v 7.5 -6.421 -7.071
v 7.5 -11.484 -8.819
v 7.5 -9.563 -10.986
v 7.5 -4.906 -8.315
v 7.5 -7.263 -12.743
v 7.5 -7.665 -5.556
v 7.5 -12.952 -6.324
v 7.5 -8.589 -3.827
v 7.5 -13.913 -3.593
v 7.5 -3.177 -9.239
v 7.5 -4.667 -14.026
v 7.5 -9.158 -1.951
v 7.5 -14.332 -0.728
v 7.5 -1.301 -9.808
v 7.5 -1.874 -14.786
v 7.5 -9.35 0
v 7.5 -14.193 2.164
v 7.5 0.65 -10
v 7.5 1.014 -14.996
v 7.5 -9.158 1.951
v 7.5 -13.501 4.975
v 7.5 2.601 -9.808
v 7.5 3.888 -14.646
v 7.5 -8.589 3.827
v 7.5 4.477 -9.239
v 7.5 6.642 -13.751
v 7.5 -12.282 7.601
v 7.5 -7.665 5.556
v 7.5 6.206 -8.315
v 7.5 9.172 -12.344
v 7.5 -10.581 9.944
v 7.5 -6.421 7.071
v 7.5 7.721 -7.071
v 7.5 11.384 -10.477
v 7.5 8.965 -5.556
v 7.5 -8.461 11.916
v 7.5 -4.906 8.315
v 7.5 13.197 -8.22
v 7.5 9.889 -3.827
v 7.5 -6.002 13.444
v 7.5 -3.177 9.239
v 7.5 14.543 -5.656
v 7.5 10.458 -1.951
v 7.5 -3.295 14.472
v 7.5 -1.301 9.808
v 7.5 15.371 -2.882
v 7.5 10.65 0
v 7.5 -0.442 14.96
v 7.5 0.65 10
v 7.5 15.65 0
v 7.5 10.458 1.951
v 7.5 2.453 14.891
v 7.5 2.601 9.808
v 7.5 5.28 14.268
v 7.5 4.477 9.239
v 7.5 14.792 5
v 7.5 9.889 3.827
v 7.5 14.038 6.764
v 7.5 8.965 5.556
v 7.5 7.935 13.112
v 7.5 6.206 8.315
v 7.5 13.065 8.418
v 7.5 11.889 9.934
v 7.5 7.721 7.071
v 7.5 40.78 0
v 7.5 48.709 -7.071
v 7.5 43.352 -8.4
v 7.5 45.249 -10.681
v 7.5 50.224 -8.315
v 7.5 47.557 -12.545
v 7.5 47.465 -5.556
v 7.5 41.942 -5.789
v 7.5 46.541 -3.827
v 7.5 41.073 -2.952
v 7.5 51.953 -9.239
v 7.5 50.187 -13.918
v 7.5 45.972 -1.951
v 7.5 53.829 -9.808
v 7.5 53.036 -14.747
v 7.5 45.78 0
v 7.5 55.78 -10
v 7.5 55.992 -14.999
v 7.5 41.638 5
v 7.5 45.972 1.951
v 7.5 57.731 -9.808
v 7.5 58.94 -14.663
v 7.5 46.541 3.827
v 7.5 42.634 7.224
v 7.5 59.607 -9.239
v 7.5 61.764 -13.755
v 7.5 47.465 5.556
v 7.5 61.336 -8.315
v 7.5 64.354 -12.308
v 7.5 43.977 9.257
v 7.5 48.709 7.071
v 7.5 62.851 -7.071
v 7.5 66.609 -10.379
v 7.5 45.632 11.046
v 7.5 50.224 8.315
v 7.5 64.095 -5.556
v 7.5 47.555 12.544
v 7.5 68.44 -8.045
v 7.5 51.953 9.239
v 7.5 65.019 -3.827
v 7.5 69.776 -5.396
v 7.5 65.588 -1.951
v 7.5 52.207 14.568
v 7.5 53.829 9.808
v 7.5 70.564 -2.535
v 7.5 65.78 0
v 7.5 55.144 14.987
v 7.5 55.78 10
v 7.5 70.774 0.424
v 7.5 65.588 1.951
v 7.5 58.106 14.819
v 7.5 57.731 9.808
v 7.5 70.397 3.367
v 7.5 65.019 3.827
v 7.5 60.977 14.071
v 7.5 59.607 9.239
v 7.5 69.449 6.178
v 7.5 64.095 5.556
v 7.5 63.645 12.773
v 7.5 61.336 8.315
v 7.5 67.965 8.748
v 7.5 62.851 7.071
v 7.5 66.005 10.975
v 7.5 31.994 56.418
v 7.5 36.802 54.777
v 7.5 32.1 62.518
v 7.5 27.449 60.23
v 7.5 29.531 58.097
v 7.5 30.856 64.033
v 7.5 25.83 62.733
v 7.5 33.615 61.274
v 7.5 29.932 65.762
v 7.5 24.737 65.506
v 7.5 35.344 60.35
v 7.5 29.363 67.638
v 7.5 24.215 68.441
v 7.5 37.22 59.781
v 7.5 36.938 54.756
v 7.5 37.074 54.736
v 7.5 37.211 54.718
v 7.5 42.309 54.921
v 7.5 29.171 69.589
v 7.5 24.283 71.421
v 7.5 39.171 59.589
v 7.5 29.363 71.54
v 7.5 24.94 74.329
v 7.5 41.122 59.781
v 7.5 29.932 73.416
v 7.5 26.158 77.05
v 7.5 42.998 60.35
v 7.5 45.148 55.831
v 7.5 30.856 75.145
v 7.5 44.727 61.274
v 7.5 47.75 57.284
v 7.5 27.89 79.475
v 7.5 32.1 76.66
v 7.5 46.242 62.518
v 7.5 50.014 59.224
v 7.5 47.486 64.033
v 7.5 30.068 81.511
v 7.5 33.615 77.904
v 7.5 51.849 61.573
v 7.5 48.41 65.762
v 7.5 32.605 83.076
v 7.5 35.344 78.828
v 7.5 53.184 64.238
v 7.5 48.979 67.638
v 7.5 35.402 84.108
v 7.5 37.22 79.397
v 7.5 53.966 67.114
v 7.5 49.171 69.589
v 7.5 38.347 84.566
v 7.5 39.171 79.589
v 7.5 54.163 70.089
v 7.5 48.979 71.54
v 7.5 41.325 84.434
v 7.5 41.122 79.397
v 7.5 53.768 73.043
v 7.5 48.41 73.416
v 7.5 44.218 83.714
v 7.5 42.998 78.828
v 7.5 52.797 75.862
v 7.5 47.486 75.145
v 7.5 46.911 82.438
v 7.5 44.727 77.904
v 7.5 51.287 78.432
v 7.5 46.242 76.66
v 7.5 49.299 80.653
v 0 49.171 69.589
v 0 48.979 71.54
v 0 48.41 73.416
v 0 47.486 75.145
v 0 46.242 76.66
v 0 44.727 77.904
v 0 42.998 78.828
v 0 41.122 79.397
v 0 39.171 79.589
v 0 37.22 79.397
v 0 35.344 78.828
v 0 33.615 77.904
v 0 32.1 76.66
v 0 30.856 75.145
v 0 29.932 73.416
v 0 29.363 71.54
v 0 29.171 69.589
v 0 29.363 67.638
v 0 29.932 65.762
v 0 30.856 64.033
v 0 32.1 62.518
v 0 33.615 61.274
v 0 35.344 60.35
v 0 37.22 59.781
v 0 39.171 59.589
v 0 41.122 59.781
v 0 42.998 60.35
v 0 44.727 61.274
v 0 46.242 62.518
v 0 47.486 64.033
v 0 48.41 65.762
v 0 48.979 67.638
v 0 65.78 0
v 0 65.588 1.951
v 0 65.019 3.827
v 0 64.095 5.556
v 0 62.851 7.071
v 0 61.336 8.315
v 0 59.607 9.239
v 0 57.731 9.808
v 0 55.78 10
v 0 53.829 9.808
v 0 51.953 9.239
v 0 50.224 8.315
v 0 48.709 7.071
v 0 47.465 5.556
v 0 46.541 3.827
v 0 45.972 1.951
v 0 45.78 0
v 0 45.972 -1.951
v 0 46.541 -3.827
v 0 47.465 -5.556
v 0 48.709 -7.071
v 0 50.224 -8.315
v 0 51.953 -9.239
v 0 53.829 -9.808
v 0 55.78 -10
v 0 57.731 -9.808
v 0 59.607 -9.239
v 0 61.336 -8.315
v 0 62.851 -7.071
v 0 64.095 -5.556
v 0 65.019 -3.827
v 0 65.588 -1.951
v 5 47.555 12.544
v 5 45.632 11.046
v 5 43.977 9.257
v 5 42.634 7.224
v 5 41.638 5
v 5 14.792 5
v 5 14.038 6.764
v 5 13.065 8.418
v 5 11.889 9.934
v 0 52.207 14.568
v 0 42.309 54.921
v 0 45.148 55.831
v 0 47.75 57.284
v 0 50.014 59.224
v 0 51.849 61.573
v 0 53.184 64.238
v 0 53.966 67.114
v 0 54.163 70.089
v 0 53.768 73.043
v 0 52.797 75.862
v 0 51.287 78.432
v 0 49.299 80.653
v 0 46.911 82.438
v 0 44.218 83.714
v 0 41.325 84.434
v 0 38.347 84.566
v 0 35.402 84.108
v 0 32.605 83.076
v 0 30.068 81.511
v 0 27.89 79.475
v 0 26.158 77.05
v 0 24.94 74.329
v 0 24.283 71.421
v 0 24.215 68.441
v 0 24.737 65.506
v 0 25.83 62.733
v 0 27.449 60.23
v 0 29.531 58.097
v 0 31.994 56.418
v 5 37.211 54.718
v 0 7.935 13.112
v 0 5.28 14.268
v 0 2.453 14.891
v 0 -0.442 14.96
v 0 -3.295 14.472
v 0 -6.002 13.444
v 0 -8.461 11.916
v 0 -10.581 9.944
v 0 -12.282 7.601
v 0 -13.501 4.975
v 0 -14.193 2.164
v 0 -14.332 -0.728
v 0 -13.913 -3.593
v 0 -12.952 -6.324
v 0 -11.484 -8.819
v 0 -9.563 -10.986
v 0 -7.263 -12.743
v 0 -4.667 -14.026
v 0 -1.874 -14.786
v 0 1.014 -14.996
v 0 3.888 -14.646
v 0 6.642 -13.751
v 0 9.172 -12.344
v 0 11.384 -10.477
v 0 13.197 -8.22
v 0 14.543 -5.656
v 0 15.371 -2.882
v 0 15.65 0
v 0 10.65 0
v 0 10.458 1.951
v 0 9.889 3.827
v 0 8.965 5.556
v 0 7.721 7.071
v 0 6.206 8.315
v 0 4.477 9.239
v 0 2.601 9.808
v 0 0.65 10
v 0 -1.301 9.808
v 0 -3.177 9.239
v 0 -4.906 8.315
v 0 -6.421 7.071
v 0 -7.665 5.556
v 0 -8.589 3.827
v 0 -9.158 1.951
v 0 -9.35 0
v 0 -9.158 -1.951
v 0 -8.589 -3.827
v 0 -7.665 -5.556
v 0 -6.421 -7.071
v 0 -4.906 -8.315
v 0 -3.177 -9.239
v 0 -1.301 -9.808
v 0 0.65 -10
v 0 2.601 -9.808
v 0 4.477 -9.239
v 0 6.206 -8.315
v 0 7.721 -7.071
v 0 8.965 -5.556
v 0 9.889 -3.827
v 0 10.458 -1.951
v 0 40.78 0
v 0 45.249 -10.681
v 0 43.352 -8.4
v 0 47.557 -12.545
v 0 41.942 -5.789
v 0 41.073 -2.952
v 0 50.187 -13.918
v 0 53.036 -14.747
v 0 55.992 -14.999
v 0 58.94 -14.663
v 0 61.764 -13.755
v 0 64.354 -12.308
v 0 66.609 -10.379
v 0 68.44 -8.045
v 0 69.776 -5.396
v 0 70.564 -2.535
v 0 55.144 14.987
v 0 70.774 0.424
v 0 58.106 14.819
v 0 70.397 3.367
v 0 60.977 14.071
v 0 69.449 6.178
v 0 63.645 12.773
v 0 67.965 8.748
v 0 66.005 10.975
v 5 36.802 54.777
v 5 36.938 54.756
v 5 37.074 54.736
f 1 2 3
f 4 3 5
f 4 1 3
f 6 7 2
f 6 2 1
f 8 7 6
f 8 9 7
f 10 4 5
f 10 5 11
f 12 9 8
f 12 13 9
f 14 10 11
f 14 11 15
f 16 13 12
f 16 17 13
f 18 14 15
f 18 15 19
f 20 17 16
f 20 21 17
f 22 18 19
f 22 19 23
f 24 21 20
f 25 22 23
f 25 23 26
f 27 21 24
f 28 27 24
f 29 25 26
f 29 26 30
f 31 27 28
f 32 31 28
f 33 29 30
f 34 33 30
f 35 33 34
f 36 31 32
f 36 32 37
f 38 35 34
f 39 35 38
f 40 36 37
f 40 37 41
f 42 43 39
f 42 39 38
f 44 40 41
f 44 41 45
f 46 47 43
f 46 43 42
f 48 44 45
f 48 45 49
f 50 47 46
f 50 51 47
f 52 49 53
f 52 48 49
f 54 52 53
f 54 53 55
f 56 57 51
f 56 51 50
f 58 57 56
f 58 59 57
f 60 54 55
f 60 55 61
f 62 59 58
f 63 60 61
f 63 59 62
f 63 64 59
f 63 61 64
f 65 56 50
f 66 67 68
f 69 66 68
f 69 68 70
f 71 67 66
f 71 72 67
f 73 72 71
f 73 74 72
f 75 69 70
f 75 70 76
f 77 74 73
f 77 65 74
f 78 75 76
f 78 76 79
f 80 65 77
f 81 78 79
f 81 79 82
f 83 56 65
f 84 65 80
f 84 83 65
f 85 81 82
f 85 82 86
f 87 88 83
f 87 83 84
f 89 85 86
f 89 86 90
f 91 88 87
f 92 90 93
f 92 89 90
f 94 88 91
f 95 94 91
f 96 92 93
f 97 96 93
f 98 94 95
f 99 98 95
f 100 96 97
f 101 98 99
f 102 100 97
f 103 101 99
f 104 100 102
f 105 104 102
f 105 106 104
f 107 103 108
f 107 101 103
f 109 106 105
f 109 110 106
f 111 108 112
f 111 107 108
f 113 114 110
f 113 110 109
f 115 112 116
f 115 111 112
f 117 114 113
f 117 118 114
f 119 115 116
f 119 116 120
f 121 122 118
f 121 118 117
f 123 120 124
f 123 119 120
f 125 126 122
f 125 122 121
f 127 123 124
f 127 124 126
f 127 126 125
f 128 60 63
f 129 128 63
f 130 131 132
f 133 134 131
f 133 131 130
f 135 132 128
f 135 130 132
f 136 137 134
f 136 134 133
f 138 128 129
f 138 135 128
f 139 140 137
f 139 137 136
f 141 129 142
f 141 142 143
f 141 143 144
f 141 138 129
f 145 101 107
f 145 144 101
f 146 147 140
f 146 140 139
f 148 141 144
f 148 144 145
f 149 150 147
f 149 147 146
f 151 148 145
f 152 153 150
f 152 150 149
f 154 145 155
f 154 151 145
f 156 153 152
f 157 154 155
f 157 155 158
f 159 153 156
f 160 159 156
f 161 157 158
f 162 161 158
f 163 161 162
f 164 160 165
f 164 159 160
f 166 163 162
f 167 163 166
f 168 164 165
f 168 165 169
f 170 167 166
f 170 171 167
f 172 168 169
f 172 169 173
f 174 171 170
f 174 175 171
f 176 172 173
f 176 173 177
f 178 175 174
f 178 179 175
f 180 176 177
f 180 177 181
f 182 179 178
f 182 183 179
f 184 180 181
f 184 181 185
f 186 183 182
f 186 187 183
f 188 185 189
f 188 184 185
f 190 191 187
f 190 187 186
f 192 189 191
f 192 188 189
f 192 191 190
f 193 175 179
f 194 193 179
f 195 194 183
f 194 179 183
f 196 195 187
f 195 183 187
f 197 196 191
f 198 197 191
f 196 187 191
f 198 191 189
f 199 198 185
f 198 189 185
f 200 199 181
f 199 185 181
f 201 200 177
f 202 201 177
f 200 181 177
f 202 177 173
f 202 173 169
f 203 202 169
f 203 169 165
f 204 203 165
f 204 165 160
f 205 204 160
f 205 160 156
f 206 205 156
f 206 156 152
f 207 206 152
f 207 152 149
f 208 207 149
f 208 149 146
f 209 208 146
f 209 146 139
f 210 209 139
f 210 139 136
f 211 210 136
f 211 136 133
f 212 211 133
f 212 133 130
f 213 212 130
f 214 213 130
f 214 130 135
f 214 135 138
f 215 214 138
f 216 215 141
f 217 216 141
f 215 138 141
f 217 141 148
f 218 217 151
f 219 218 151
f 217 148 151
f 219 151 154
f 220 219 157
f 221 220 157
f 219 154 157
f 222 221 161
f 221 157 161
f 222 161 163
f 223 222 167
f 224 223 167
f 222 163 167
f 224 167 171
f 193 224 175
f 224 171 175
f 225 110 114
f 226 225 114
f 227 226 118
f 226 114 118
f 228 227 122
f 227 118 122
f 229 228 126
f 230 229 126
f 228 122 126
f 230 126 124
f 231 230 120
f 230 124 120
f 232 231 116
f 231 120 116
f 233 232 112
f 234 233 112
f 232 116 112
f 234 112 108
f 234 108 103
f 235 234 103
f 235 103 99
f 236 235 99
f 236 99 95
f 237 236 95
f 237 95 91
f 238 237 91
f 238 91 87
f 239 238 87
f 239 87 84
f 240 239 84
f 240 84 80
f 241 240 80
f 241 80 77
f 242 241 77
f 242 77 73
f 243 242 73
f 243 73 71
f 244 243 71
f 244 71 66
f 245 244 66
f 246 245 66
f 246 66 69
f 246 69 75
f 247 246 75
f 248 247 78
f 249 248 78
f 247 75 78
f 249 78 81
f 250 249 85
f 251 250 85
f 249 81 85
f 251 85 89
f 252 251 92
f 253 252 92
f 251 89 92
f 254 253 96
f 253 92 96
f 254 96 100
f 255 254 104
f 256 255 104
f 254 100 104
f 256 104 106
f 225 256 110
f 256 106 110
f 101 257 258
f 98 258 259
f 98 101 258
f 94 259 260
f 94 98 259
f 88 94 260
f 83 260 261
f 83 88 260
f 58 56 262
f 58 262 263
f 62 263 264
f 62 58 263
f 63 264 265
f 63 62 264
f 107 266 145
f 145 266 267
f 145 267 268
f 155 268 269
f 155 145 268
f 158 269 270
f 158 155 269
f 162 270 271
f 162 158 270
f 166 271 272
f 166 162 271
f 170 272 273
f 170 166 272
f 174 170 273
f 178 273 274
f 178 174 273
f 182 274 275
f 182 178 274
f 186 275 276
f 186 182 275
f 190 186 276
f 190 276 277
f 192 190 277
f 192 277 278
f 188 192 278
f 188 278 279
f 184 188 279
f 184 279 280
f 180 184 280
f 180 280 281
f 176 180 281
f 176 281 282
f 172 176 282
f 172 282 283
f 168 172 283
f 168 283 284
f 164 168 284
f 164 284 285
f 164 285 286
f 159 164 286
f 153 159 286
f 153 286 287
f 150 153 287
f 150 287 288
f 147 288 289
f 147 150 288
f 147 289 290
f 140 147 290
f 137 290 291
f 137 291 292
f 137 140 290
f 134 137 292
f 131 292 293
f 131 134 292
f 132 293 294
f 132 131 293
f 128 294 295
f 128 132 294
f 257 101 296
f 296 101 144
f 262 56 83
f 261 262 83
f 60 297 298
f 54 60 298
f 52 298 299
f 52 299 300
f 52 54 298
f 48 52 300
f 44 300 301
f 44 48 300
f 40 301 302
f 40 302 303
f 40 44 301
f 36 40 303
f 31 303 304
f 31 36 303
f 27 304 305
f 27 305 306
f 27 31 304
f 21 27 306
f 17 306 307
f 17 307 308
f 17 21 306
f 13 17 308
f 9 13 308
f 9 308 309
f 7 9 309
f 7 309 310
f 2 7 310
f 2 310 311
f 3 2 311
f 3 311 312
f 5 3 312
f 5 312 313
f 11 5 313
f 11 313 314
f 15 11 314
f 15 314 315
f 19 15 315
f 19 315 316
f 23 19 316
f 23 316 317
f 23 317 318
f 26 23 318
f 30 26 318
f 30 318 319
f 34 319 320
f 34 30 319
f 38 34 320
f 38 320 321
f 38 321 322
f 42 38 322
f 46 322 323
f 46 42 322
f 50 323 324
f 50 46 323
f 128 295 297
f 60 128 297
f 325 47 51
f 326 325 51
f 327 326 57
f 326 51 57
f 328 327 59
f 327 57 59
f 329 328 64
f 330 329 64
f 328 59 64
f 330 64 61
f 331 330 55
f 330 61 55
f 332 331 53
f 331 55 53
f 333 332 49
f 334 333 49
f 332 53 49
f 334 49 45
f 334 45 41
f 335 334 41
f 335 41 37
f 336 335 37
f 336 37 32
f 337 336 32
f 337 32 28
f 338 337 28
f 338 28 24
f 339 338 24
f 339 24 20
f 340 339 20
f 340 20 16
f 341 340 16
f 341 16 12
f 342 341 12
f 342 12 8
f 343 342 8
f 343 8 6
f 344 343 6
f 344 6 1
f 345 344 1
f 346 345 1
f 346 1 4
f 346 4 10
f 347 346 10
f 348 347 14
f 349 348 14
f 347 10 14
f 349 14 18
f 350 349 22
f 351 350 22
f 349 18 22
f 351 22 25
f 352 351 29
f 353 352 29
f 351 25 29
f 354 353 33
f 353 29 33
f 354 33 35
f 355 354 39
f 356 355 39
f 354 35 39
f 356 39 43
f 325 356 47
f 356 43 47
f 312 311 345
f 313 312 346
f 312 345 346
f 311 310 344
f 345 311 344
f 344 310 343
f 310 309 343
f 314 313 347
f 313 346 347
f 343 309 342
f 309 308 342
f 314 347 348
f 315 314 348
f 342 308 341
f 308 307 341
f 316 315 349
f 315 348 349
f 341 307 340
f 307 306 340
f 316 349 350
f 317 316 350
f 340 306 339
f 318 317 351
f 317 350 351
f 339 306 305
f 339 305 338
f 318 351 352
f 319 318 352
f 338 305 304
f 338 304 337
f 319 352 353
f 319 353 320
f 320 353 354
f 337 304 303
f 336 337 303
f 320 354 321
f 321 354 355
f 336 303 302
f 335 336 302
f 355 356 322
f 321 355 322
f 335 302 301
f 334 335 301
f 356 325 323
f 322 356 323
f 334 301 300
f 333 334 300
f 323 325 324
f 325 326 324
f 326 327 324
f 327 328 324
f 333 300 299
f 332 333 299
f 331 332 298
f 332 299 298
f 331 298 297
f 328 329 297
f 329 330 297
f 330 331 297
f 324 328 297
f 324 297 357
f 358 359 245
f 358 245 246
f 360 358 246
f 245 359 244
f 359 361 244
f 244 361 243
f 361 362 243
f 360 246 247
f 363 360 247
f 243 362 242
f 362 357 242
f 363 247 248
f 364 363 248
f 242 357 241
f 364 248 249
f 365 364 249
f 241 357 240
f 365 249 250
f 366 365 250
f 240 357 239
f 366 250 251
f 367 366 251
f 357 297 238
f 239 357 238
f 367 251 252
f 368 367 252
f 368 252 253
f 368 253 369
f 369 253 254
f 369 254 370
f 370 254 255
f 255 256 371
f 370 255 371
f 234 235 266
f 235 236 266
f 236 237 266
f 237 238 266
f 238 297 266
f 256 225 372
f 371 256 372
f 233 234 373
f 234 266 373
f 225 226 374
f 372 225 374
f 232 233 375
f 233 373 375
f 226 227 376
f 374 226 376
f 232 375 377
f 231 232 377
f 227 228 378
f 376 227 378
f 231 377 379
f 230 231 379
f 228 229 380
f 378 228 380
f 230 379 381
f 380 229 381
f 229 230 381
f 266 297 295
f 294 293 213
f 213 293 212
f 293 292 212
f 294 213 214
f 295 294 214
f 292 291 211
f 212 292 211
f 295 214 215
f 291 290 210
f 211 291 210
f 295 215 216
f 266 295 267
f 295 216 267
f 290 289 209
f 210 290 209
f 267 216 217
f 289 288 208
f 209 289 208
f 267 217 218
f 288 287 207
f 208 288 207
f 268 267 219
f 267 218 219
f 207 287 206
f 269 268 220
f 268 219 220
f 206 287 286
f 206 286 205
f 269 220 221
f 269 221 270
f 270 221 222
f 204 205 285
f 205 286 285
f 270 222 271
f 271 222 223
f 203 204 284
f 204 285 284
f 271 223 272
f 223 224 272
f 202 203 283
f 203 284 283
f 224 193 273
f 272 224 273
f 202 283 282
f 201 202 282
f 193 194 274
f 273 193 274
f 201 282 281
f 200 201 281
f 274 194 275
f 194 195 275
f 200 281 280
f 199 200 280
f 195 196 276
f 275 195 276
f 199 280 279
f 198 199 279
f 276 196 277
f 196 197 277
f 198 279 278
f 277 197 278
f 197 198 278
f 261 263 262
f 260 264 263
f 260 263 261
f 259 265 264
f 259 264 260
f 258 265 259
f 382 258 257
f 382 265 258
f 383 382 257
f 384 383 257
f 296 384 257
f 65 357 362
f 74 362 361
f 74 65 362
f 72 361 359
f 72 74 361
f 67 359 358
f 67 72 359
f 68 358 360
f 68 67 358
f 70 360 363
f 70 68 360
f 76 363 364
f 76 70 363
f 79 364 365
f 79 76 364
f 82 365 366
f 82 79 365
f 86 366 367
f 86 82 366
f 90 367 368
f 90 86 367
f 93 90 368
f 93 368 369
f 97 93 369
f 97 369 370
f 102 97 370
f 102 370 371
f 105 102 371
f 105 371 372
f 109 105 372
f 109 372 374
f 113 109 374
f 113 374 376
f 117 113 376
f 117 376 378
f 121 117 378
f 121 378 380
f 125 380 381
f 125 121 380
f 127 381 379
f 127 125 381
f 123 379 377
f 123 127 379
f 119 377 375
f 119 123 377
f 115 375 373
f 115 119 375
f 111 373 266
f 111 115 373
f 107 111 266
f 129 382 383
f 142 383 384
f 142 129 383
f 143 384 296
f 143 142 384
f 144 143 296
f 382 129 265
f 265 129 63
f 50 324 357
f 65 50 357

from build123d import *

# Parameters (mm, degrees)
F1_DEPTH = 7.5
F4_DEPTH = 2.5
F5_R     = 15
F6_DEPTH = 7.5
F7_R     = 10
F8_DEPTH = 25


with BuildPart() as f1:
    # F0 (on Right) → F1 (new body)
    with BuildSketch(Plane.YZ):
        Polygon((38.8950196707, 68.8394845703), (0.6499171856, 0), (55.7799171856, 0), align=None)
    extrude(amount=F1_DEPTH)

    # F3 (on offset) → F4 (cut)
    with BuildSketch(Plane.YZ.offset(7.5)):
        Polygon((49.4053139018, 4.9999990523), (37.0754110185, 55.2688359545), (9.1475897815, 4.9999990523), align=None)
    extrude(amount=-F4_DEPTH, mode=Mode.SUBTRACT)

    # F5 (on offset) → F6 (join)
    with BuildSketch(Plane.YZ.offset(7.5)):
        with Locations((39.171077311, 69.5889517665)):
            Circle(F5_R)
        with Locations((55.7799171856, 0)):
            Circle(F5_R)
        with Locations((0.6499171856, 0)):
            Circle(F5_R)
    extrude(amount=-F6_DEPTH)

    # F7 (on offset) → F8 (cut)
    with BuildSketch(Plane.YZ.offset(7.5)):
        with Locations((0.6499171856, 0)):
            Circle(F7_R)
        with Locations((55.7799171856, 0)):
            Circle(F7_R)
        with Locations((39.171077311, 69.5889517665)):
            Circle(F7_R)
    extrude(amount=-F8_DEPTH, mode=Mode.SUBTRACT)


solid = f1.part
